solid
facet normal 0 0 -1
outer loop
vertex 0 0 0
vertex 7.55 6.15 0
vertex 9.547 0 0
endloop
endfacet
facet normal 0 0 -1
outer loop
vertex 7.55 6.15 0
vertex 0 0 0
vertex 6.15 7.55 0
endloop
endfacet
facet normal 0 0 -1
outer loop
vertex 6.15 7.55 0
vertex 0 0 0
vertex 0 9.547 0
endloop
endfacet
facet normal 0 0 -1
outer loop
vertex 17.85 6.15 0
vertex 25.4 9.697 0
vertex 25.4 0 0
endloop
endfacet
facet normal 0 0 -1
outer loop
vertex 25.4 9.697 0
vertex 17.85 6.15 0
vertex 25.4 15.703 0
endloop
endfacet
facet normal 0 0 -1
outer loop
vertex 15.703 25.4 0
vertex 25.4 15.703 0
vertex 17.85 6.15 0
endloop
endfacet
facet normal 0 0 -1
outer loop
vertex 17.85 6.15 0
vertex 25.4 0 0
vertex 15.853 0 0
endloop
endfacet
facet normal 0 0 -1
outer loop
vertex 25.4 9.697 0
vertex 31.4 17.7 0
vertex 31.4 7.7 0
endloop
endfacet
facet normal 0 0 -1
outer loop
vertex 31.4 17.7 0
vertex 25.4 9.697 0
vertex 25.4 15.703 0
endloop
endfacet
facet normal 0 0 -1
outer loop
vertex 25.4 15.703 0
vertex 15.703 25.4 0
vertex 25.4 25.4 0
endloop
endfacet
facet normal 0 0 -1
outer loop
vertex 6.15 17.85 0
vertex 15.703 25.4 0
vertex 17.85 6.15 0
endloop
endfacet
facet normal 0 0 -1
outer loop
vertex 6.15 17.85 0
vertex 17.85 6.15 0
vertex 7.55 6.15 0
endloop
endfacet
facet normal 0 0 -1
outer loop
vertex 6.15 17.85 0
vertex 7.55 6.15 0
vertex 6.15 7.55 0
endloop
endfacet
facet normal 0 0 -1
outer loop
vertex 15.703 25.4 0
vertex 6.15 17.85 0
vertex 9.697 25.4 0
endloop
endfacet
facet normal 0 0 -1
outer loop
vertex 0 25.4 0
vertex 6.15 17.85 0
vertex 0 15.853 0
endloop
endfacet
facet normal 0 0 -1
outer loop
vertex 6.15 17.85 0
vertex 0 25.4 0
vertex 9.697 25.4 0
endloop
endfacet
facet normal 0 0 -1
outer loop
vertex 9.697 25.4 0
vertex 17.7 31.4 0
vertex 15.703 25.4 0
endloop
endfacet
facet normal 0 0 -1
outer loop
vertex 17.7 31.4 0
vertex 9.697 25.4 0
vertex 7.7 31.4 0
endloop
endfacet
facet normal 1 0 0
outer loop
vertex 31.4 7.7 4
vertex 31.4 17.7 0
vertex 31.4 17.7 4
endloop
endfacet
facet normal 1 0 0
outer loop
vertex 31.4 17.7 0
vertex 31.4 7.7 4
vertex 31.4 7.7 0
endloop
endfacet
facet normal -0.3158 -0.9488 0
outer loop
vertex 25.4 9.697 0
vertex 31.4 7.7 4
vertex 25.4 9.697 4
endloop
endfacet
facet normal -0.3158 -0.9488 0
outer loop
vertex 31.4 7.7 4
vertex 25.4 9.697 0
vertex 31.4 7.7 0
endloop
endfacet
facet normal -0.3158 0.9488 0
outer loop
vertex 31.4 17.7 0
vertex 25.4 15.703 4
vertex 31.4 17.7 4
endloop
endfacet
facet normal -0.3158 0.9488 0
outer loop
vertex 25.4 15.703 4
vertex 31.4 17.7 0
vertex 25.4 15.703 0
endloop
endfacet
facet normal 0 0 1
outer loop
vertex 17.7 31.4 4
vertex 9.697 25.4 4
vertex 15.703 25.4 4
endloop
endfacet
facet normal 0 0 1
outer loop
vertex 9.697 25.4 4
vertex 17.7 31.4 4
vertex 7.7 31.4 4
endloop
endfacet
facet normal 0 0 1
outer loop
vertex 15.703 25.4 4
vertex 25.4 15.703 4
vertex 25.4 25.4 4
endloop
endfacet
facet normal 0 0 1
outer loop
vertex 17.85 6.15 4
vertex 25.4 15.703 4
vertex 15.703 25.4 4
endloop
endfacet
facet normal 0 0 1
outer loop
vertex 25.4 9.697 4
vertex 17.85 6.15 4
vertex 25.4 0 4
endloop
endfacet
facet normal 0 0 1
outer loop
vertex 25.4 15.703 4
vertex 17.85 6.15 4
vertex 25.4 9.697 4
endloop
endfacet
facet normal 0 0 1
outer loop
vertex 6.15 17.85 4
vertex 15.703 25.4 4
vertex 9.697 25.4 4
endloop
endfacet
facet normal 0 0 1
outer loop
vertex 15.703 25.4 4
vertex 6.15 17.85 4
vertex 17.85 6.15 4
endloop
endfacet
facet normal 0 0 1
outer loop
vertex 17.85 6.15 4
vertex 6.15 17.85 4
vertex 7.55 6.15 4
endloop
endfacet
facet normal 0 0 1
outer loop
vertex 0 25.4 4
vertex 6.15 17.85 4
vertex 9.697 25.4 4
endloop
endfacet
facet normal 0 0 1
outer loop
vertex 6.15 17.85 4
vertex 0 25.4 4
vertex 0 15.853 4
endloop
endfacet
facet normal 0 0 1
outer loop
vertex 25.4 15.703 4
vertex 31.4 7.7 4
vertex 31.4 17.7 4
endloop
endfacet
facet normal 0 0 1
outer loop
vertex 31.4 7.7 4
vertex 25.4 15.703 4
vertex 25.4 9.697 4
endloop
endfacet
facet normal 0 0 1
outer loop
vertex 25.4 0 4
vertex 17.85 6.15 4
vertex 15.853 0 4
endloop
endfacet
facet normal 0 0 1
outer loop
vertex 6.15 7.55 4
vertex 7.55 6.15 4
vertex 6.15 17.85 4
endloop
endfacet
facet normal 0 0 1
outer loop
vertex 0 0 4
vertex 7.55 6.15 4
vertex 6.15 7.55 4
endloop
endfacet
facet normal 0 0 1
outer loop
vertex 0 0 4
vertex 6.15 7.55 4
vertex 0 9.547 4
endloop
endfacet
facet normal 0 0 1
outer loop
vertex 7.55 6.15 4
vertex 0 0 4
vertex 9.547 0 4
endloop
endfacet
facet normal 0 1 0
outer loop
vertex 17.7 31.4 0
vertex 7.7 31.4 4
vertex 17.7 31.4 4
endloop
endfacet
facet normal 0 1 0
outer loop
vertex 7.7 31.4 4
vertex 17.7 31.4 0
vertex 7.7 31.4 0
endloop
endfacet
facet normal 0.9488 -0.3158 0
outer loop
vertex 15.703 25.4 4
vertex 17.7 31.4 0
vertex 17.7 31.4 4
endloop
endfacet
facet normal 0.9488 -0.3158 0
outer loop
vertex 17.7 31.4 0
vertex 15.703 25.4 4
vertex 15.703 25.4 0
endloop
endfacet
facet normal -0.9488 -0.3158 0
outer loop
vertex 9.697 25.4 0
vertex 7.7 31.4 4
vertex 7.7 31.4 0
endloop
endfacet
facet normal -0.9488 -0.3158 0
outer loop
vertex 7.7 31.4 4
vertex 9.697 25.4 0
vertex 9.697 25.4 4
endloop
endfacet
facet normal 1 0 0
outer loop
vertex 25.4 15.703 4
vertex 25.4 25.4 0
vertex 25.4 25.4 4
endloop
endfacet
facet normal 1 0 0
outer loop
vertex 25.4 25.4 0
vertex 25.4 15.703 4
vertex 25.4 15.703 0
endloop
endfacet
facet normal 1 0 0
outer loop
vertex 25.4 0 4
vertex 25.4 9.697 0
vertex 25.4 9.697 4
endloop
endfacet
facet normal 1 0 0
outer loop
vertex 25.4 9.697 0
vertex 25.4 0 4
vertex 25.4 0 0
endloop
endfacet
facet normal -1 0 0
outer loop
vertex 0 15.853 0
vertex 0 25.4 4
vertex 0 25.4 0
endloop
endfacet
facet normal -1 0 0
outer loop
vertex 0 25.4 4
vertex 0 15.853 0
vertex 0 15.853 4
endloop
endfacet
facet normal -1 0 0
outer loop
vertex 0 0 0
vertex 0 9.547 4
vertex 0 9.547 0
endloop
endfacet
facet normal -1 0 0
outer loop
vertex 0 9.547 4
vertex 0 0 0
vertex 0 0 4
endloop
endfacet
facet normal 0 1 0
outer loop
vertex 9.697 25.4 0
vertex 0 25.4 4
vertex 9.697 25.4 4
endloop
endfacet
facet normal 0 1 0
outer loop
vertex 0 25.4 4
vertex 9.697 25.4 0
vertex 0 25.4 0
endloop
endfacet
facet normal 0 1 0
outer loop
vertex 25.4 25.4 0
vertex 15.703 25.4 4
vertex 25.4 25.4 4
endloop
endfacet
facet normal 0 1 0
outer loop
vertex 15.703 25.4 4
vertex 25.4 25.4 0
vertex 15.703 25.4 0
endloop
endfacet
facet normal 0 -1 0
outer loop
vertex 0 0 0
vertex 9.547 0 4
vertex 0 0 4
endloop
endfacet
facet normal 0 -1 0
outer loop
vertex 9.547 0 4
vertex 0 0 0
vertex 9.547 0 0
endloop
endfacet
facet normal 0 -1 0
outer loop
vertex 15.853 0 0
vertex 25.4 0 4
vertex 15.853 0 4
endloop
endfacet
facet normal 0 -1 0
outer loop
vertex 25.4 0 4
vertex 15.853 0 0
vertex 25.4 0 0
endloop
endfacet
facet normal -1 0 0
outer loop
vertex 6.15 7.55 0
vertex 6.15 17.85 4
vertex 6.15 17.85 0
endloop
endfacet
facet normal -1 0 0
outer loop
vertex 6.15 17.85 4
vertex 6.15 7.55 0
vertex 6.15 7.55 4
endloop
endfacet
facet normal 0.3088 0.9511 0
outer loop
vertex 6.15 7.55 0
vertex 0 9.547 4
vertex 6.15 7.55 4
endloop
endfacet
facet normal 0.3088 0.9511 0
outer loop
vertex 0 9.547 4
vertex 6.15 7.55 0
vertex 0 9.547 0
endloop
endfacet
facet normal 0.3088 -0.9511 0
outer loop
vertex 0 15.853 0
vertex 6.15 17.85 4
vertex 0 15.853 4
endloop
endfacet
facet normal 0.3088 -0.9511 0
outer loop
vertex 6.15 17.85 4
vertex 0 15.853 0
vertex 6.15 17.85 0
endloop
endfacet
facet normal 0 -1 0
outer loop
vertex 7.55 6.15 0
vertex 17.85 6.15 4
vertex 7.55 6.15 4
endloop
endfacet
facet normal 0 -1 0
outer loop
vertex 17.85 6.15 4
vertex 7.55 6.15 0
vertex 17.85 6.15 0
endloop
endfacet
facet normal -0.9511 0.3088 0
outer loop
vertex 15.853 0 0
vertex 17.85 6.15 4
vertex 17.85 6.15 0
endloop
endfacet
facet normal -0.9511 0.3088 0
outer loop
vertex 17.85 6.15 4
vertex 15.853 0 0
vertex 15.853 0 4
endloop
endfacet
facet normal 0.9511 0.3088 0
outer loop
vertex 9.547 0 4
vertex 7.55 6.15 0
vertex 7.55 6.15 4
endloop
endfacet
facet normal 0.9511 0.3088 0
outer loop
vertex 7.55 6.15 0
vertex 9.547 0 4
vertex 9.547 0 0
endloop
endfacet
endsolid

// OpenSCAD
// file: ../lib/pieces.scad
// pieces.scad — the core piece library (Phase 1).
// Requires grid.scad and connectors.scad to be included first.
//
// Grid convention: floors fill grid cells; walls run along grid lines,
// centered on them. Chains of gendered (tab) pieces alternate
// male-into-female; magnet/dowel/none pieces are genderless.

// Wall-end dovetail, sized to fit inside the wall thickness (absolute).
WALL_TAB_NECK  = 3;
WALL_TAB_HEAD  = 4.8;
WALL_TAB_DEPTH = 4;

// Structural thicknesses auto-grow when a magnet must fit in the edge.
function floor_t() = (CONNECTOR == "magnet")
    ? max(scaled(FLOOR_THICKNESS), magnet_d() + 2.4)
    : scaled(FLOOR_THICKNESS);
function wall_t() = (CONNECTOR == "magnet")
    ? max(scaled(WALL_THICKNESS), magnet_d() + 2.4)
    : scaled(WALL_THICKNESS);
function wall_h() = grid(WALL_HEIGHT_UNITS);

// ---------------------------------------------------------------------
// Floor tile: w x l grid cells, one connector centered per grid-square
// edge segment. Tab gender: male on +X and +Y edges, female on -X and
// -Y, so identically-oriented tiles tessellate in both directions.
module floor_tile(w = 1, l = 1) {
    t = floor_t();
    difference() {
        union() {
            cube([grid(w), grid(l), t]);
            if (CONNECTOR == "tab") {
                for (j = [0 : l - 1])
                    translate([grid(w), grid(j + 0.5), 0]) tab_male(t);
                for (i = [0 : w - 1])
                    translate([grid(i + 0.5), grid(l), 0])
                        rotate([0, 0, 90]) tab_male(t);
            }
        }
        if (CONNECTOR == "tab") {
            for (j = [0 : l - 1])
                translate([0, grid(j + 0.5), 0]) tab_female(t);
            for (i = [0 : w - 1])
                translate([grid(i + 0.5), 0, 0])
                    rotate([0, 0, 90]) tab_female(t);
        }
        if (CONNECTOR == "magnet" || CONNECTOR == "dowel") {
            for (j = [0 : l - 1]) {
                translate([0, grid(j + 0.5), 0]) edge_fastener(t / 2);
                translate([grid(w), grid(j + 0.5), 0])
                    mirror([1, 0, 0]) edge_fastener(t / 2);
            }
            for (i = [0 : w - 1]) {
                translate([grid(i + 0.5), 0, 0])
                    rotate([0, 0, 90]) edge_fastener(t / 2);
                translate([grid(i + 0.5), grid(l), 0])
                    mirror([0, 1, 0]) rotate([0, 0, 90])
                        edge_fastener(t / 2);
            }
        }
    }
}

// Magnet pocket or dowel hole, per the active CONNECTOR.
module edge_fastener(z) {
    if (CONNECTOR == "magnet") magnet_pocket(z);
    if (CONNECTOR == "dowel")  dowel_hole(z);
}

// ---------------------------------------------------------------------
// Straight wall: `units` grid squares long, centered on the grid line
// (y = 0). Tab gender: male at +X end, female at -X end; the tab runs
// the full height as a vertical sliding dovetail. Magnet/dowel: two
// fasteners per end face.
module wall_straight(units = 1) {
    h  = wall_h();
    wt = wall_t();
    difference() {
        union() {
            translate([0, -wt / 2, 0]) cube([grid(units), wt, h]);
            if (CONNECTOR == "tab")
                translate([grid(units), 0, 0])
                    tab_male(h, WALL_TAB_NECK, WALL_TAB_HEAD,
                             WALL_TAB_DEPTH);
        }
        if (CONNECTOR == "tab")
            tab_female(h, fit_clearance(), WALL_TAB_NECK, WALL_TAB_HEAD,
                       WALL_TAB_DEPTH);
        for (z = wall_fastener_heights()) {
            edge_fastener(z);
            translate([grid(units), 0, 0]) mirror([1, 0, 0])
                edge_fastener(z);
        }
    }
}

function wall_fastener_heights() =
    (CONNECTOR == "magnet" || CONNECTOR == "dowel")
        ? [grid(0.5), wall_h() - grid(0.5)] : [];

// ---------------------------------------------------------------------
// 90-degree corner: one arm along +X, one along +Y, each one grid
// square long, meeting at the grid-line crossing (origin). Tab gender:
// male at the +X arm end, female at the +Y arm end (opening outward),
// so a chain enters one arm and exits the other. Tab chains are
// chiral: set mirrored = true for the opposite-handed corner.
module wall_corner(mirrored = false) {
    h  = wall_h();
    wt = wall_t();
    mirror([mirrored ? 1 : 0, 0, 0])
        difference() {
            union() {
                translate([-wt / 2, -wt / 2, 0])
                    cube([grid(1) + wt / 2, wt, h]);
                translate([-wt / 2, -wt / 2, 0])
                    cube([wt, grid(1) + wt / 2, h]);
                if (CONNECTOR == "tab")
                    translate([grid(1), 0, 0])
                        tab_male(h, WALL_TAB_NECK, WALL_TAB_HEAD,
                                 WALL_TAB_DEPTH);
            }
            if (CONNECTOR == "tab")
                translate([0, grid(1), 0]) rotate([0, 0, -90])
                    tab_female(h, fit_clearance(), WALL_TAB_NECK,
                               WALL_TAB_HEAD, WALL_TAB_DEPTH);
            for (z = wall_fastener_heights()) {
                translate([grid(1), 0, 0]) mirror([1, 0, 0])
                    edge_fastener(z);
                translate([0, grid(1), 0]) mirror([0, 1, 0])
                    rotate([0, 0, 90]) edge_fastener(z);
            }
        }
}
// file: ../lib/connectors.scad
// connectors.scad — shared connector geometry.
// Requires grid.scad to be included first.
//
// Convention: a connector lives on an edge face lying in the YZ plane
// at x = 0, centered on y = 0, with the piece's material on the -X
// side for male parts and the +X side for female parts. Pieces
// translate/rotate these modules into position.
//
// All fit-critical dimensions here are ABSOLUTE (see grid.scad).

// Connector type used by all pieces: "tab" | "magnet" | "dowel" | "none".
// Tab & slot is gendered (a piece has male and female edges); magnet,
// dowel, and none are genderless, so tiles can be rotated freely.
CONNECTOR = "tab";

// Tab & slot (puzzle-style dovetail, full piece thickness). Defaults
// suit flat tiles; walls pass smaller dims that fit inside their
// thickness (see pieces.scad).
TAB_NECK  = 6;    // width at the edge face
TAB_HEAD  = 10;   // width at the tip
TAB_DEPTH = 6;    // how far the tab projects

// Dowel pin (1.75mm filament offcuts make free pins).
DOWEL_D     = 1.85;
DOWEL_DEPTH = 6;

// Magnet pocket. Named size "DxH" in mm.
MAGNET = "5x2";
function magnet_d(m = MAGNET) =
    m == "3x2" ? 3 : m == "6x2" ? 6 : m == "8x3" ? 8 : 5;
function magnet_h(m = MAGNET) =
    m == "8x3" ? 3 : 2;

// Dovetail profile, projecting toward +X. grow > 0 loosens the female.
module tab_profile(grow = 0, neck = TAB_NECK, head = TAB_HEAD,
                   depth = TAB_DEPTH) {
    polygon([
        [-EPS,         -(neck / 2 + grow)],
        [depth + grow, -(head / 2 + grow)],
        [depth + grow,   head / 2 + grow],
        [-EPS,           neck / 2 + grow]
    ]);
}

// Male tab: union onto a piece whose edge face is at x = 0, material
// on -X. The tab projects +X into the neighboring piece's slot.
module tab_male(thickness, neck = TAB_NECK, head = TAB_HEAD,
                depth = TAB_DEPTH) {
    linear_extrude(height = thickness)
        tab_profile(0, neck, head, depth);
}

// Female slot: subtract from a piece whose edge face is at x = 0,
// material on +X. The cut extends +X into the material, opening at the
// edge face so the mating tab enters from -X.
module tab_female(thickness, clearance = fit_clearance(),
                  neck = TAB_NECK, head = TAB_HEAD, depth = TAB_DEPTH) {
    translate([0, 0, -EPS])
        linear_extrude(height = thickness + 2 * EPS)
            tab_profile(clearance, neck, head, depth);
}

// Cylindrical pocket bored into an edge face at x = 0, material on +X,
// axis along +X, centered at height z.
module edge_pocket(d, depth, z) {
    translate([-EPS, 0, z])
        rotate([0, 90, 0])
            cylinder(h = depth + EPS, d = d);
}

// Magnet pocket (female on both mating pieces). Slight extra depth so
// the magnet seats flush after glue.
module magnet_pocket(z, m = MAGNET, clearance = fit_clearance()) {
    edge_pocket(magnet_d(m) + clearance, magnet_h(m) + 0.1, z);
}

// Dowel hole (female on both mating pieces).
module dowel_hole(z, clearance = fit_clearance()) {
    edge_pocket(DOWEL_D + clearance, DOWEL_DEPTH, z);
}
// file: ../lib/grid.scad
// grid.scad — core grid, scale, and tolerance foundation.
// Every piece in the system includes this file.
//
// Two classes of dimension, never mixed:
//   scaled()  — aesthetic sizes; follow SCALE so kits can be resized.
//   absolute  — fit-critical sizes (clearances, magnet pockets, pin
//               holes); constant regardless of SCALE.

// One tabletop grid square. 25.4mm (1 inch) keeps pieces in register
// with battlemats and standard 2-inch tile systems. Change once to
// retarget the whole library (e.g. 32 for a 32mm module standard).
GRID_UNIT = 25.4;

// Aesthetic scale multiplier (1.0 = 28mm heroic terrain).
SCALE = 1.0;

// Default structural sizes (scaled, mm at SCALE = 1.0).
FLOOR_THICKNESS   = 4;
WALL_THICKNESS    = 6;
WALL_HEIGHT_UNITS = 2;   // wall height in grid units

// Fit preset: "tight" | "normal" | "loose". Absolute mm — never scaled.
FIT = "normal";

function fit_clearance(fit = FIT) =
    fit == "tight" ? 0.10 :
    fit == "loose" ? 0.25 :
                     0.15;

// Helpers.
function scaled(x) = x * SCALE;
function grid(n)   = n * GRID_UNIT * SCALE;

// Boolean-overlap epsilon for clean CSG.
EPS = 0.01;

// Curve quality.
$fa = 4;
$fs = 0.4;
// main file
// floor_tile.scad — flat floor tile, FLOOR_W x FLOOR_L grid squares.
include <../lib/grid.scad>
include <../lib/connectors.scad>
include <../lib/pieces.scad>

FLOOR_W = 1;
FLOOR_L = 1;

floor_tile(FLOOR_W, FLOOR_L);
